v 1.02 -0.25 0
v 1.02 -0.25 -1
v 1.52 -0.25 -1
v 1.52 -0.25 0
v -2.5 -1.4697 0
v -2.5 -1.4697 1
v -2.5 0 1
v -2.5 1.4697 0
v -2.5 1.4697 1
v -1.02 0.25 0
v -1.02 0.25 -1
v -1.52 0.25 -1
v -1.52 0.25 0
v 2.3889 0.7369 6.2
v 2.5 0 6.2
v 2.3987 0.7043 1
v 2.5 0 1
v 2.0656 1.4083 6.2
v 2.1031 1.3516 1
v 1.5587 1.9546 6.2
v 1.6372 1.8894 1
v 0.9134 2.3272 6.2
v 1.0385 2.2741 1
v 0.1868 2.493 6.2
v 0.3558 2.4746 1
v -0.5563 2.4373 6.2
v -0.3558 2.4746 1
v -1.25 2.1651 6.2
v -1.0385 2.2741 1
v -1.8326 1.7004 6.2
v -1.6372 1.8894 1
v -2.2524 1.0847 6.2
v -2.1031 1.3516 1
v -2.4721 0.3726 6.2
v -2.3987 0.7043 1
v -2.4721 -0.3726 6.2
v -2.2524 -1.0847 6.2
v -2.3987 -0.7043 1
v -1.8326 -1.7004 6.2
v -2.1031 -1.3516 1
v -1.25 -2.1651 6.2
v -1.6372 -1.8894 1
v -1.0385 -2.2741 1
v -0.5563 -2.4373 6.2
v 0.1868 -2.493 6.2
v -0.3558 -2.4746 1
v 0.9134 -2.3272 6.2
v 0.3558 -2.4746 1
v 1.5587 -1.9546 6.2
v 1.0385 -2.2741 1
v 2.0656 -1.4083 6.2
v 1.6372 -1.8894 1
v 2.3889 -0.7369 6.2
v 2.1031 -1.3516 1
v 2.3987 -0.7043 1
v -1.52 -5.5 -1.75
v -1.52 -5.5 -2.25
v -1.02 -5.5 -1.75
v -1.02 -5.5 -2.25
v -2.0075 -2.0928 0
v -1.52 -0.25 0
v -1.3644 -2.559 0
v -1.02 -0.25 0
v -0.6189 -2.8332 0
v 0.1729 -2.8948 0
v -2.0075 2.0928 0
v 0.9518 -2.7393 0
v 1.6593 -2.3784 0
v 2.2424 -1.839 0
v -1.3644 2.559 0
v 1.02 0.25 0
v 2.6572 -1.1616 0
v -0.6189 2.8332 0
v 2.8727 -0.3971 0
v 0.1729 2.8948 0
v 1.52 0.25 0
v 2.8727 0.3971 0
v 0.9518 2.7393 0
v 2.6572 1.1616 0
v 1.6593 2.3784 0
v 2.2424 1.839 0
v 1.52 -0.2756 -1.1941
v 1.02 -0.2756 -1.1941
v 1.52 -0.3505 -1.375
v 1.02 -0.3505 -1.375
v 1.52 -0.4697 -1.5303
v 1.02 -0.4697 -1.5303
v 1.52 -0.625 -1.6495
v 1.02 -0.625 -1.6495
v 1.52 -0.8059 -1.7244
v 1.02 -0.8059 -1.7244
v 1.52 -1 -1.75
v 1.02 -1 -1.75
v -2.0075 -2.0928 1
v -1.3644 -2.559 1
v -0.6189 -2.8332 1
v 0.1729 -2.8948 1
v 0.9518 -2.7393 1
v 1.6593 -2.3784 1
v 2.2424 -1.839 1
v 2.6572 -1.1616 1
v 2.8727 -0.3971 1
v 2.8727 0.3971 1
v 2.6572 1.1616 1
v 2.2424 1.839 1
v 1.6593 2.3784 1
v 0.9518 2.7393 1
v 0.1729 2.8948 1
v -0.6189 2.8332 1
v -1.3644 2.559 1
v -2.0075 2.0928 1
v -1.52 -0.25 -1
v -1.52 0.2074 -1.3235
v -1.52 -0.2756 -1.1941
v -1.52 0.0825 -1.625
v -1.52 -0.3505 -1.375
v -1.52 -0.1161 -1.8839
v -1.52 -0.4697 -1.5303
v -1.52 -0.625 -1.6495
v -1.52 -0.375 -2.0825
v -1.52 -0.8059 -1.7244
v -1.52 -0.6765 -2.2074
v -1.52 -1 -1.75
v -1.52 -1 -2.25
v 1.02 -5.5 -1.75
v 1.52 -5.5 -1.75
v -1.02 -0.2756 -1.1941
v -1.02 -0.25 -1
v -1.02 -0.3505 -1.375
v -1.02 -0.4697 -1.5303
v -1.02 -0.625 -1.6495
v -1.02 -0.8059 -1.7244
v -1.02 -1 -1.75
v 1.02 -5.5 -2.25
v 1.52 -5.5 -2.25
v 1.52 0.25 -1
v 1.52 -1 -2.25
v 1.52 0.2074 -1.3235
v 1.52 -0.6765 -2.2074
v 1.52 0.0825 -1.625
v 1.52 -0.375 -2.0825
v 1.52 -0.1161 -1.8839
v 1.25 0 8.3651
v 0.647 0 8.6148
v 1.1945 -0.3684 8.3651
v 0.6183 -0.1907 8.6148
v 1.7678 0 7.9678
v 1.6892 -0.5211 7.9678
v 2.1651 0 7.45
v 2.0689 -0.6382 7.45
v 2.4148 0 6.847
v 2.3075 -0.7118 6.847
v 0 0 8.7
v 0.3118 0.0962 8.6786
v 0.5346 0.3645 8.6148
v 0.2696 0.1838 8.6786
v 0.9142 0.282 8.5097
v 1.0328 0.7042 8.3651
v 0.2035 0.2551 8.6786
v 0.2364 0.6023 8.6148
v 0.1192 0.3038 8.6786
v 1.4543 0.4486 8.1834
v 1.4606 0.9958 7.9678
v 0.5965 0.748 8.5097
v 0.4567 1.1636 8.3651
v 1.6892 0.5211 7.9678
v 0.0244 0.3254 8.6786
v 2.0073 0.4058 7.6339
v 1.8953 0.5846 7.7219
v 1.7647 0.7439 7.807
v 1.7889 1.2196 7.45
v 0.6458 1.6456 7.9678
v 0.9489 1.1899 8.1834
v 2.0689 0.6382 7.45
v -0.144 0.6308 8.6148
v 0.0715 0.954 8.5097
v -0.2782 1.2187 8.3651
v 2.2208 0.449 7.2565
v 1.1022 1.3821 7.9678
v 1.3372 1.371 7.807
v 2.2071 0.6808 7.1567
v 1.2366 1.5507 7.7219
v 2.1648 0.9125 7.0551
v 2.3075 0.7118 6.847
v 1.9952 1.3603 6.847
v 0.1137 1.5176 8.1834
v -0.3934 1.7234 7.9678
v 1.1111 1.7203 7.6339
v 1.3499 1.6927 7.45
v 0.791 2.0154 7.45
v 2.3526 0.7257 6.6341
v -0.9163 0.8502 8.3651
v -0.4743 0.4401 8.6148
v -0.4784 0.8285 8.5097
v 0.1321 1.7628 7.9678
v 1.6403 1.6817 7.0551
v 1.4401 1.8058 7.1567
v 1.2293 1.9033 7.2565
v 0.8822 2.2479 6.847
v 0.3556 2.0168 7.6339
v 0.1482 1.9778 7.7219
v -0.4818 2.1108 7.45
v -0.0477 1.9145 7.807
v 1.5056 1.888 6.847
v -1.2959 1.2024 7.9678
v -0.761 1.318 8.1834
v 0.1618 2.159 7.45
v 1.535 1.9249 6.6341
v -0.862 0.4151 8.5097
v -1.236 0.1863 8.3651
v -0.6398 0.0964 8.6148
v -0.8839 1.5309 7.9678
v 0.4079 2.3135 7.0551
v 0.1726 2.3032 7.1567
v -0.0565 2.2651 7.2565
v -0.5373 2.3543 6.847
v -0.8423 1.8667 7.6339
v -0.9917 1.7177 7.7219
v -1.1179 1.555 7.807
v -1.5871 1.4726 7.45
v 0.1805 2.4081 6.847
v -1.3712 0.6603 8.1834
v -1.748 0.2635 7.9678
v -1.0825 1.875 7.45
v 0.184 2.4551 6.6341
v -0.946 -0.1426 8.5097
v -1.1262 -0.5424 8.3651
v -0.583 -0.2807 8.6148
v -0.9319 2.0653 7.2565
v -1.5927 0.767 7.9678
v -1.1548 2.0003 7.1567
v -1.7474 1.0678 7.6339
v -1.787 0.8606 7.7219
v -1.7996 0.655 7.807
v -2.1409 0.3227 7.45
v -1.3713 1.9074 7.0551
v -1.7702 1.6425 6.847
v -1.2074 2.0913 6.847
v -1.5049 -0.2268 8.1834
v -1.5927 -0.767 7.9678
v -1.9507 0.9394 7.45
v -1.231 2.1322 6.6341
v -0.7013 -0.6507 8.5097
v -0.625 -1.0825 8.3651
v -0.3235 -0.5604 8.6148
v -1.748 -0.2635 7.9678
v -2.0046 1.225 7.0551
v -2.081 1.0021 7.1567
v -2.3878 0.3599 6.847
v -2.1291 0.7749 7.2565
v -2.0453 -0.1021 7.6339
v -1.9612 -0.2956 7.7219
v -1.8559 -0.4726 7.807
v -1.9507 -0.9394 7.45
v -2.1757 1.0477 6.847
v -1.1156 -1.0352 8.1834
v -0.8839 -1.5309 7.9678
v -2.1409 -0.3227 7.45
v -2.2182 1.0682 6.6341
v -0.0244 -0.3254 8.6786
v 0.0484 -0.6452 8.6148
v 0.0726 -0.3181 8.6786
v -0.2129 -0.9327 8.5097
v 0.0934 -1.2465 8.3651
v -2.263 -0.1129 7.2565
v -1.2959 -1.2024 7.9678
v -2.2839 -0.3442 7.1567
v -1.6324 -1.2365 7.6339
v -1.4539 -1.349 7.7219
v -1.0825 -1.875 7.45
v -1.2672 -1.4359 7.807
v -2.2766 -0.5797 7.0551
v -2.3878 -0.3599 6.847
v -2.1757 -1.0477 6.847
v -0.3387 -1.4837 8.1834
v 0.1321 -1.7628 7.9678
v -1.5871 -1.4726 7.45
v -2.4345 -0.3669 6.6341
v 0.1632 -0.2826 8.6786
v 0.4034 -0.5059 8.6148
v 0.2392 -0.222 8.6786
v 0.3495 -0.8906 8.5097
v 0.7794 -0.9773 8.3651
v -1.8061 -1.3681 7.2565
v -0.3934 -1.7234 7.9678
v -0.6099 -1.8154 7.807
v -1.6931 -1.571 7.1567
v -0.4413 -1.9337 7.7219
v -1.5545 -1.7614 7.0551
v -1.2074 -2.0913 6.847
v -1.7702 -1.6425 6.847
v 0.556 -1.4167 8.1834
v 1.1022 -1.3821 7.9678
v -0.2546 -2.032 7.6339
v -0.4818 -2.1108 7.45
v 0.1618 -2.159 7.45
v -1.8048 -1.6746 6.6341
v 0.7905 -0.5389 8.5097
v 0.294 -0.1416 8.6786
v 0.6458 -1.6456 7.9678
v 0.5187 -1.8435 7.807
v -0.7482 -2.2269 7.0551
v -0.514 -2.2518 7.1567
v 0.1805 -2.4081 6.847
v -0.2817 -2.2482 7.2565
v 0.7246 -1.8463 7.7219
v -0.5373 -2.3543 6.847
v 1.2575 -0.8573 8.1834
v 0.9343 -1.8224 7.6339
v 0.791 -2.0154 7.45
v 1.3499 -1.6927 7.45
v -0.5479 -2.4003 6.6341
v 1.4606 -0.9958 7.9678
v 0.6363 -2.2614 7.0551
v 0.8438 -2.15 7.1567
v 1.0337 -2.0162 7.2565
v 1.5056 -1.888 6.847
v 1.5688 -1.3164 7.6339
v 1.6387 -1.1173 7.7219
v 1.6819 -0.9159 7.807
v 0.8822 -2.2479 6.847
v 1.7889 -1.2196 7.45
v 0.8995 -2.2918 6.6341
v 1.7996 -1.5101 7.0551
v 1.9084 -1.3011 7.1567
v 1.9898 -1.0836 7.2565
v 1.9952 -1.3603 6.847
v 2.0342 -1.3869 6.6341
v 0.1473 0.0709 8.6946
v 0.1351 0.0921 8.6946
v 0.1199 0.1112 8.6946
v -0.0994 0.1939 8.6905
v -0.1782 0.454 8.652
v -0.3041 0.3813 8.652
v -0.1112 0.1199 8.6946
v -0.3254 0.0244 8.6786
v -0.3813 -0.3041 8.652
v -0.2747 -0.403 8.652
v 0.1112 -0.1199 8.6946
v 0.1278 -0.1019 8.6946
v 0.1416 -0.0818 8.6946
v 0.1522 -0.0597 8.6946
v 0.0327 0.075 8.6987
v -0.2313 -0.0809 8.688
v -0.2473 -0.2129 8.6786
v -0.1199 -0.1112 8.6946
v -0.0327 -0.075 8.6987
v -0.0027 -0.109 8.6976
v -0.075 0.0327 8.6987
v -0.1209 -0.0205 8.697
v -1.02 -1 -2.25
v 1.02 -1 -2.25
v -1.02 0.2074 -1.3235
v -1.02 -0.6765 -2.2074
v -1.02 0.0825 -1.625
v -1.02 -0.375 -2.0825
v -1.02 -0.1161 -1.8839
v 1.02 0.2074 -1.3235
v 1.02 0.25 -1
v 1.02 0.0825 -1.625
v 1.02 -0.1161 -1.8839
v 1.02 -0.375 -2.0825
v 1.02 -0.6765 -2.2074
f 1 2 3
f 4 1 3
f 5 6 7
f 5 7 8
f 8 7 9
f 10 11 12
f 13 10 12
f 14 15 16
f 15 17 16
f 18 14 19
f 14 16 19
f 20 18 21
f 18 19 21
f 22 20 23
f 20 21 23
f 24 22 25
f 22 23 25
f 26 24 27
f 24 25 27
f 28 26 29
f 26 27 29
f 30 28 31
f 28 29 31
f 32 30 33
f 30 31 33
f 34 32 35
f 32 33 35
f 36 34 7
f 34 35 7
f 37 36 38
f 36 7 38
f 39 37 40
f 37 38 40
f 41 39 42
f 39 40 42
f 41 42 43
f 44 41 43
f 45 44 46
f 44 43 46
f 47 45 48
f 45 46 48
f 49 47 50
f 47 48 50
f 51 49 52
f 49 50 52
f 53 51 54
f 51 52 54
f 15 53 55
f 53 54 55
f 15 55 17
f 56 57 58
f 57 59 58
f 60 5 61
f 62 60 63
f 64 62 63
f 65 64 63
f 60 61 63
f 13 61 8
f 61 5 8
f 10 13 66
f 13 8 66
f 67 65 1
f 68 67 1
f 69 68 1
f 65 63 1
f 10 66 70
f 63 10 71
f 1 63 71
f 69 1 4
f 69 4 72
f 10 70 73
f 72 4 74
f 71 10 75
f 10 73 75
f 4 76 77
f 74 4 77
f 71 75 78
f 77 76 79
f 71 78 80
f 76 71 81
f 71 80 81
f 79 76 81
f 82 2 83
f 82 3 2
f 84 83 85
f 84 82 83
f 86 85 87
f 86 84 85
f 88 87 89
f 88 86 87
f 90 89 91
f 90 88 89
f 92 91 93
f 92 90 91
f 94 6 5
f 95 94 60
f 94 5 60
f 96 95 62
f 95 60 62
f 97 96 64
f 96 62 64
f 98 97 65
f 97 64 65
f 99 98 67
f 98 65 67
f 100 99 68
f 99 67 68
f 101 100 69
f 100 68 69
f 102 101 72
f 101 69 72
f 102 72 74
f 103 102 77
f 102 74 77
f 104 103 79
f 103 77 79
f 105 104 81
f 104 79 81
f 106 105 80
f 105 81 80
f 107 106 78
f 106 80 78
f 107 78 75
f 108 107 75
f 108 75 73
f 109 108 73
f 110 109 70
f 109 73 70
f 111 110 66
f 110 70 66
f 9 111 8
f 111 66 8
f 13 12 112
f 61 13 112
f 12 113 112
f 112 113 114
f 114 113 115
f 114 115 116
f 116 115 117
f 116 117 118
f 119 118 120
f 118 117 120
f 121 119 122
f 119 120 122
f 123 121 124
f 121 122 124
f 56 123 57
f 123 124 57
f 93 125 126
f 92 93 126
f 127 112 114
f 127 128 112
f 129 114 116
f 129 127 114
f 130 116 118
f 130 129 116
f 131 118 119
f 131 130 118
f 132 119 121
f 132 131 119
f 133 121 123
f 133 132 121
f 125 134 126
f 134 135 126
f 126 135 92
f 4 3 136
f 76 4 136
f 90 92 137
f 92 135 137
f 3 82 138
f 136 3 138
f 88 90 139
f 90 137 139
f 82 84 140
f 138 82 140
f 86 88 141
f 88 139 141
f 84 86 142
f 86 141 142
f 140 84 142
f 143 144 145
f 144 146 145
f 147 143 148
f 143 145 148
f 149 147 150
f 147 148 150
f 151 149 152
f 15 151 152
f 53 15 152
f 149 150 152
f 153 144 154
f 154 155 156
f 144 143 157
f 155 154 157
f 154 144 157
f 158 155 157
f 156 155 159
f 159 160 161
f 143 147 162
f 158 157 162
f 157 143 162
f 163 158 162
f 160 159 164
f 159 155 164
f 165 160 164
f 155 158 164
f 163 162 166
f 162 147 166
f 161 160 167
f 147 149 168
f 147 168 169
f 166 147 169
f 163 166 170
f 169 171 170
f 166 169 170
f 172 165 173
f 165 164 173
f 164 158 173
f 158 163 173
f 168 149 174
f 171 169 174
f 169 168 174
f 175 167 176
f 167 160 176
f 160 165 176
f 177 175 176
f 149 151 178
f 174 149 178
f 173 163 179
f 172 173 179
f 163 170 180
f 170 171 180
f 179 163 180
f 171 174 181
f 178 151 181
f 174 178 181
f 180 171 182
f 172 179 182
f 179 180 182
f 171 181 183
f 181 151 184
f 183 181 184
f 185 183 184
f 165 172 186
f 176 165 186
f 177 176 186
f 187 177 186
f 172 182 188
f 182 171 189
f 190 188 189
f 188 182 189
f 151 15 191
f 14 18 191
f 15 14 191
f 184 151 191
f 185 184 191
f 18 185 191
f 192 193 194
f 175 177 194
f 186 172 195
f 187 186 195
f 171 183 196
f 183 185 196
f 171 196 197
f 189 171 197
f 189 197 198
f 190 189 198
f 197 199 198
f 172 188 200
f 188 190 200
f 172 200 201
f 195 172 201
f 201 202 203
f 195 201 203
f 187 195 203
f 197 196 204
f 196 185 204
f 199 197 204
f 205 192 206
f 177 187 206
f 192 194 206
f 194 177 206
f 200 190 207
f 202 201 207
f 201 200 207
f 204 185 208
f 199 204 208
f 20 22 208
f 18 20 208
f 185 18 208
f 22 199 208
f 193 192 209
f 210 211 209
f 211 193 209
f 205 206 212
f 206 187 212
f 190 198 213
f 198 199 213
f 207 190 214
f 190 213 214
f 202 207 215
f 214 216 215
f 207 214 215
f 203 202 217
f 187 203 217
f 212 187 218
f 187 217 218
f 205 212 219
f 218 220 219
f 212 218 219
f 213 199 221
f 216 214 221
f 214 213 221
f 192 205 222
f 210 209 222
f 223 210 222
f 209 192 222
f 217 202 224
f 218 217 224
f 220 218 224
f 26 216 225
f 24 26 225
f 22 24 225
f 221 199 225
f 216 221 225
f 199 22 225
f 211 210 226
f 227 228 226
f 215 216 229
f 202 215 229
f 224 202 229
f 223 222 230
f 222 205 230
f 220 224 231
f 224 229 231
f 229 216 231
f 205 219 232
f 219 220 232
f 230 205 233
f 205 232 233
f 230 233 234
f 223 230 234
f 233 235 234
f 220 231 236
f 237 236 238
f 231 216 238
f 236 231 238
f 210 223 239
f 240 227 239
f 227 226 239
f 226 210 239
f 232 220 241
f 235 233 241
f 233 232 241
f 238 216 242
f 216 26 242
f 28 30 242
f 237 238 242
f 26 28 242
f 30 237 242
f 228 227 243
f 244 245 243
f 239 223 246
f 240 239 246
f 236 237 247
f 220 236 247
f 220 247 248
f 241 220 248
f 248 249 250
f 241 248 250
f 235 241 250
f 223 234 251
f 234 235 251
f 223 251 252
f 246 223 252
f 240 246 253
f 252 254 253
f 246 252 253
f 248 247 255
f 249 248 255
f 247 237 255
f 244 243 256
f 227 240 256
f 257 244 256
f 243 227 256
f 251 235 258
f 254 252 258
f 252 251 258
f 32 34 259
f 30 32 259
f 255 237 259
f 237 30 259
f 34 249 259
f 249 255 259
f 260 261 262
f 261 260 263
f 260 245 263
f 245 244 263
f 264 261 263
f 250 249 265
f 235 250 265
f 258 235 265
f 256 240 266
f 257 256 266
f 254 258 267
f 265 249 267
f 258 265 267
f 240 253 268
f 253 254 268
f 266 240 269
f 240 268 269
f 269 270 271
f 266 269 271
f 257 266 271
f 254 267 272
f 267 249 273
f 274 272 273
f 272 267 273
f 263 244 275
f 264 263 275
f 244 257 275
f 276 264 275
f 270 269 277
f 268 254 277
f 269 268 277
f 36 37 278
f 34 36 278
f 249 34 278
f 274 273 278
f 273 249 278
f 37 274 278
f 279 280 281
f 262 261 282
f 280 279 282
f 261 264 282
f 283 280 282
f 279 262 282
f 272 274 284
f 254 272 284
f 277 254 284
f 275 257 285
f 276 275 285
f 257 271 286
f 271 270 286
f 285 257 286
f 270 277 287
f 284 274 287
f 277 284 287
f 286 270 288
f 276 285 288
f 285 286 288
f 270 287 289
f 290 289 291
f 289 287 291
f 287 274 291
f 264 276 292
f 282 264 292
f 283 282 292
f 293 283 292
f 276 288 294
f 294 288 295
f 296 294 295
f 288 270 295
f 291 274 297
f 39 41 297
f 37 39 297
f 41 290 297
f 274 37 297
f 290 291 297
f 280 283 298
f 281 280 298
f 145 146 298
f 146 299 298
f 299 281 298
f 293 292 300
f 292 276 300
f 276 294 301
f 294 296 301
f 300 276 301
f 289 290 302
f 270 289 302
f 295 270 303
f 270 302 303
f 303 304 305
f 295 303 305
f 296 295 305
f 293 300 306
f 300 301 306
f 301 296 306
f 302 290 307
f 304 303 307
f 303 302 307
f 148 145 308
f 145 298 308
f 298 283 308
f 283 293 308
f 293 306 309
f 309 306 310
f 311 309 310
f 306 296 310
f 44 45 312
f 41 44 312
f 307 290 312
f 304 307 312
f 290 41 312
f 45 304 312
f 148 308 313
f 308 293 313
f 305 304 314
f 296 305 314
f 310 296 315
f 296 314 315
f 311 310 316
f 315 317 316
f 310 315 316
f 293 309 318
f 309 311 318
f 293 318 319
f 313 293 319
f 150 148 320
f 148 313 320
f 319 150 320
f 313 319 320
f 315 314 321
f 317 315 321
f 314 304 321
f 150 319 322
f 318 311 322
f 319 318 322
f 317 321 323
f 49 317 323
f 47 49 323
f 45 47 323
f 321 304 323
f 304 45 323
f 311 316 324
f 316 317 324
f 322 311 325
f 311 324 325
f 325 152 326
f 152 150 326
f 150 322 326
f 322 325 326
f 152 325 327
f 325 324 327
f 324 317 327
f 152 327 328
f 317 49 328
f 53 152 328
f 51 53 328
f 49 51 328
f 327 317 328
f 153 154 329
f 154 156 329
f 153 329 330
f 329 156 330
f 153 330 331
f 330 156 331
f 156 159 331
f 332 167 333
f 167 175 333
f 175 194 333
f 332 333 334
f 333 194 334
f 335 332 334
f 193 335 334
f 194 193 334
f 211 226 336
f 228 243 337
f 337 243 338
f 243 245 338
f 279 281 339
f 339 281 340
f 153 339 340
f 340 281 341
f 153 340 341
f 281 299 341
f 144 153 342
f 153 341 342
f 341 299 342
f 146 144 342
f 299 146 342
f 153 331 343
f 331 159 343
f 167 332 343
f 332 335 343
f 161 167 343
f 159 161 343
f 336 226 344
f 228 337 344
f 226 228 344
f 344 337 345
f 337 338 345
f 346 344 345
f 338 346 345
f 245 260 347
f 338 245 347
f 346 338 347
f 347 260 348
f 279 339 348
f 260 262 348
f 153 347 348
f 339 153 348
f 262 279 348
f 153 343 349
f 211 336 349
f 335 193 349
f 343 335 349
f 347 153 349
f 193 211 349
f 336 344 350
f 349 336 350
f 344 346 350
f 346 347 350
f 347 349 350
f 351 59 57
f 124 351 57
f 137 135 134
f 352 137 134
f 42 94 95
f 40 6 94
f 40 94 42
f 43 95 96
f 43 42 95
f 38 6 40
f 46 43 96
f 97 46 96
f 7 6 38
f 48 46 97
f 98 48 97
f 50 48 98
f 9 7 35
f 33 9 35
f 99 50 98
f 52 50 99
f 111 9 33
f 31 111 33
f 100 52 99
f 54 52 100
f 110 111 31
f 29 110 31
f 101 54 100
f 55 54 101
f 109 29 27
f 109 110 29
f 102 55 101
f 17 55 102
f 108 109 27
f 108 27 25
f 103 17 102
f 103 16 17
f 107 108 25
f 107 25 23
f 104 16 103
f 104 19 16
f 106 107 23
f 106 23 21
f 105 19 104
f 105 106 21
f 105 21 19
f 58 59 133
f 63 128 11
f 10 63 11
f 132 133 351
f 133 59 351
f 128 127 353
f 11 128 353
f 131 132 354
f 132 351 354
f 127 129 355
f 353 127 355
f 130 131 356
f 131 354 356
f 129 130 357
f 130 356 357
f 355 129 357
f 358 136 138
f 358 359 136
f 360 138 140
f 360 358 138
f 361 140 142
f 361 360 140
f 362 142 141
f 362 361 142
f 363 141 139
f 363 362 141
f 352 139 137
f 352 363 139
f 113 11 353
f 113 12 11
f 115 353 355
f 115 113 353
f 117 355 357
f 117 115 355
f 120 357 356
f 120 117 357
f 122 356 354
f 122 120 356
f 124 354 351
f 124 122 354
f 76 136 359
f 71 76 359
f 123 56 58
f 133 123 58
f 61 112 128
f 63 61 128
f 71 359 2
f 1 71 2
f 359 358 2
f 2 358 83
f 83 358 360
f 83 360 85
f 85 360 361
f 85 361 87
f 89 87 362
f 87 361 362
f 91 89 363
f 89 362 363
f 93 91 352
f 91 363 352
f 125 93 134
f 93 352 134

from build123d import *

# Parameters (mm, degrees)
ESQUISSE3_R                  = 2.9
BOSS_EXTRU_1_DEPTH           = 1
ENL_V_MAT_EXTRU_1_DEPTH      = 8.7000001
ENL_V_MAT_EXTRU_1_DEPTH_BACK = 2
ESQUISSE7_W                  = 0.5
ESQUISSE7_H                  = 0.5


with BuildPart() as part:
    # Esquisse3 → Boss.-Extru.1 (new body)
    with BuildSketch(Plane.XY):
        Circle(ESQUISSE3_R)
    extrude(amount=BOSS_EXTRU_1_DEPTH)

    # Esquisse5 → Révolution1 (revolve)
    with BuildSketch(Plane(origin=(0, 0, 0), x_dir=(1, 0, 0), z_dir=(0, 1, 0))):
        with BuildLine():
            Line((0, -1), (0, -8.7))
            ThreePointArc((0, -8.7), (1.767766953, -7.96776677), (2.5, -6.199999817))
            Line((2.5, -6.199999817), (2.5, -1))
            Line((2.5, -1), (0, -1))
        make_face()
    revolve(axis=Axis((0, 0, 1), (0, 0, 1)))

    # Esquisse6 → Enlèv. mat.-Extru.1 (cut, two sides)
    with BuildSketch(Plane.XY.offset(1)) as enl_v_mat_extru_1_sk:
        Polygon((-2.5, 25.362745966), (-2.5, 1.469693846), (-2.5, -1.469693846), (-2.5, -25.362745966), (-50.286104241, -25.362745966), (-50.286104241, 25.362745966), align=None)
    extrude(amount=ENL_V_MAT_EXTRU_1_DEPTH, mode=Mode.SUBTRACT)
    extrude(enl_v_mat_extru_1_sk.sketch, amount=-ENL_V_MAT_EXTRU_1_DEPTH_BACK, mode=Mode.SUBTRACT)

    # Balayage1: sweep along a path in Esquisse8
    with BuildLine(Plane(origin=(0, 0, 0), x_dir=(0, 0, -1), z_dir=(1, 0, 0))) as balayage1_path:
        Line((0, 0), (1, 0))
        ThreePointArc((1, 0), (1.707106781, -0.292893219), (2, -1))
        Line((2, -1), (2, -5.5))
    # Esquisse7 → Balayage1 (sweep)
    with BuildSketch(Plane.XY):
        with Locations((1.27, 0)):
            Rectangle(ESQUISSE7_W, ESQUISSE7_H)
        with Locations((-1.27, 0)):
            Rectangle(ESQUISSE7_W, ESQUISSE7_H)
    sweep(path=balayage1_path.line)


solid = part.part
